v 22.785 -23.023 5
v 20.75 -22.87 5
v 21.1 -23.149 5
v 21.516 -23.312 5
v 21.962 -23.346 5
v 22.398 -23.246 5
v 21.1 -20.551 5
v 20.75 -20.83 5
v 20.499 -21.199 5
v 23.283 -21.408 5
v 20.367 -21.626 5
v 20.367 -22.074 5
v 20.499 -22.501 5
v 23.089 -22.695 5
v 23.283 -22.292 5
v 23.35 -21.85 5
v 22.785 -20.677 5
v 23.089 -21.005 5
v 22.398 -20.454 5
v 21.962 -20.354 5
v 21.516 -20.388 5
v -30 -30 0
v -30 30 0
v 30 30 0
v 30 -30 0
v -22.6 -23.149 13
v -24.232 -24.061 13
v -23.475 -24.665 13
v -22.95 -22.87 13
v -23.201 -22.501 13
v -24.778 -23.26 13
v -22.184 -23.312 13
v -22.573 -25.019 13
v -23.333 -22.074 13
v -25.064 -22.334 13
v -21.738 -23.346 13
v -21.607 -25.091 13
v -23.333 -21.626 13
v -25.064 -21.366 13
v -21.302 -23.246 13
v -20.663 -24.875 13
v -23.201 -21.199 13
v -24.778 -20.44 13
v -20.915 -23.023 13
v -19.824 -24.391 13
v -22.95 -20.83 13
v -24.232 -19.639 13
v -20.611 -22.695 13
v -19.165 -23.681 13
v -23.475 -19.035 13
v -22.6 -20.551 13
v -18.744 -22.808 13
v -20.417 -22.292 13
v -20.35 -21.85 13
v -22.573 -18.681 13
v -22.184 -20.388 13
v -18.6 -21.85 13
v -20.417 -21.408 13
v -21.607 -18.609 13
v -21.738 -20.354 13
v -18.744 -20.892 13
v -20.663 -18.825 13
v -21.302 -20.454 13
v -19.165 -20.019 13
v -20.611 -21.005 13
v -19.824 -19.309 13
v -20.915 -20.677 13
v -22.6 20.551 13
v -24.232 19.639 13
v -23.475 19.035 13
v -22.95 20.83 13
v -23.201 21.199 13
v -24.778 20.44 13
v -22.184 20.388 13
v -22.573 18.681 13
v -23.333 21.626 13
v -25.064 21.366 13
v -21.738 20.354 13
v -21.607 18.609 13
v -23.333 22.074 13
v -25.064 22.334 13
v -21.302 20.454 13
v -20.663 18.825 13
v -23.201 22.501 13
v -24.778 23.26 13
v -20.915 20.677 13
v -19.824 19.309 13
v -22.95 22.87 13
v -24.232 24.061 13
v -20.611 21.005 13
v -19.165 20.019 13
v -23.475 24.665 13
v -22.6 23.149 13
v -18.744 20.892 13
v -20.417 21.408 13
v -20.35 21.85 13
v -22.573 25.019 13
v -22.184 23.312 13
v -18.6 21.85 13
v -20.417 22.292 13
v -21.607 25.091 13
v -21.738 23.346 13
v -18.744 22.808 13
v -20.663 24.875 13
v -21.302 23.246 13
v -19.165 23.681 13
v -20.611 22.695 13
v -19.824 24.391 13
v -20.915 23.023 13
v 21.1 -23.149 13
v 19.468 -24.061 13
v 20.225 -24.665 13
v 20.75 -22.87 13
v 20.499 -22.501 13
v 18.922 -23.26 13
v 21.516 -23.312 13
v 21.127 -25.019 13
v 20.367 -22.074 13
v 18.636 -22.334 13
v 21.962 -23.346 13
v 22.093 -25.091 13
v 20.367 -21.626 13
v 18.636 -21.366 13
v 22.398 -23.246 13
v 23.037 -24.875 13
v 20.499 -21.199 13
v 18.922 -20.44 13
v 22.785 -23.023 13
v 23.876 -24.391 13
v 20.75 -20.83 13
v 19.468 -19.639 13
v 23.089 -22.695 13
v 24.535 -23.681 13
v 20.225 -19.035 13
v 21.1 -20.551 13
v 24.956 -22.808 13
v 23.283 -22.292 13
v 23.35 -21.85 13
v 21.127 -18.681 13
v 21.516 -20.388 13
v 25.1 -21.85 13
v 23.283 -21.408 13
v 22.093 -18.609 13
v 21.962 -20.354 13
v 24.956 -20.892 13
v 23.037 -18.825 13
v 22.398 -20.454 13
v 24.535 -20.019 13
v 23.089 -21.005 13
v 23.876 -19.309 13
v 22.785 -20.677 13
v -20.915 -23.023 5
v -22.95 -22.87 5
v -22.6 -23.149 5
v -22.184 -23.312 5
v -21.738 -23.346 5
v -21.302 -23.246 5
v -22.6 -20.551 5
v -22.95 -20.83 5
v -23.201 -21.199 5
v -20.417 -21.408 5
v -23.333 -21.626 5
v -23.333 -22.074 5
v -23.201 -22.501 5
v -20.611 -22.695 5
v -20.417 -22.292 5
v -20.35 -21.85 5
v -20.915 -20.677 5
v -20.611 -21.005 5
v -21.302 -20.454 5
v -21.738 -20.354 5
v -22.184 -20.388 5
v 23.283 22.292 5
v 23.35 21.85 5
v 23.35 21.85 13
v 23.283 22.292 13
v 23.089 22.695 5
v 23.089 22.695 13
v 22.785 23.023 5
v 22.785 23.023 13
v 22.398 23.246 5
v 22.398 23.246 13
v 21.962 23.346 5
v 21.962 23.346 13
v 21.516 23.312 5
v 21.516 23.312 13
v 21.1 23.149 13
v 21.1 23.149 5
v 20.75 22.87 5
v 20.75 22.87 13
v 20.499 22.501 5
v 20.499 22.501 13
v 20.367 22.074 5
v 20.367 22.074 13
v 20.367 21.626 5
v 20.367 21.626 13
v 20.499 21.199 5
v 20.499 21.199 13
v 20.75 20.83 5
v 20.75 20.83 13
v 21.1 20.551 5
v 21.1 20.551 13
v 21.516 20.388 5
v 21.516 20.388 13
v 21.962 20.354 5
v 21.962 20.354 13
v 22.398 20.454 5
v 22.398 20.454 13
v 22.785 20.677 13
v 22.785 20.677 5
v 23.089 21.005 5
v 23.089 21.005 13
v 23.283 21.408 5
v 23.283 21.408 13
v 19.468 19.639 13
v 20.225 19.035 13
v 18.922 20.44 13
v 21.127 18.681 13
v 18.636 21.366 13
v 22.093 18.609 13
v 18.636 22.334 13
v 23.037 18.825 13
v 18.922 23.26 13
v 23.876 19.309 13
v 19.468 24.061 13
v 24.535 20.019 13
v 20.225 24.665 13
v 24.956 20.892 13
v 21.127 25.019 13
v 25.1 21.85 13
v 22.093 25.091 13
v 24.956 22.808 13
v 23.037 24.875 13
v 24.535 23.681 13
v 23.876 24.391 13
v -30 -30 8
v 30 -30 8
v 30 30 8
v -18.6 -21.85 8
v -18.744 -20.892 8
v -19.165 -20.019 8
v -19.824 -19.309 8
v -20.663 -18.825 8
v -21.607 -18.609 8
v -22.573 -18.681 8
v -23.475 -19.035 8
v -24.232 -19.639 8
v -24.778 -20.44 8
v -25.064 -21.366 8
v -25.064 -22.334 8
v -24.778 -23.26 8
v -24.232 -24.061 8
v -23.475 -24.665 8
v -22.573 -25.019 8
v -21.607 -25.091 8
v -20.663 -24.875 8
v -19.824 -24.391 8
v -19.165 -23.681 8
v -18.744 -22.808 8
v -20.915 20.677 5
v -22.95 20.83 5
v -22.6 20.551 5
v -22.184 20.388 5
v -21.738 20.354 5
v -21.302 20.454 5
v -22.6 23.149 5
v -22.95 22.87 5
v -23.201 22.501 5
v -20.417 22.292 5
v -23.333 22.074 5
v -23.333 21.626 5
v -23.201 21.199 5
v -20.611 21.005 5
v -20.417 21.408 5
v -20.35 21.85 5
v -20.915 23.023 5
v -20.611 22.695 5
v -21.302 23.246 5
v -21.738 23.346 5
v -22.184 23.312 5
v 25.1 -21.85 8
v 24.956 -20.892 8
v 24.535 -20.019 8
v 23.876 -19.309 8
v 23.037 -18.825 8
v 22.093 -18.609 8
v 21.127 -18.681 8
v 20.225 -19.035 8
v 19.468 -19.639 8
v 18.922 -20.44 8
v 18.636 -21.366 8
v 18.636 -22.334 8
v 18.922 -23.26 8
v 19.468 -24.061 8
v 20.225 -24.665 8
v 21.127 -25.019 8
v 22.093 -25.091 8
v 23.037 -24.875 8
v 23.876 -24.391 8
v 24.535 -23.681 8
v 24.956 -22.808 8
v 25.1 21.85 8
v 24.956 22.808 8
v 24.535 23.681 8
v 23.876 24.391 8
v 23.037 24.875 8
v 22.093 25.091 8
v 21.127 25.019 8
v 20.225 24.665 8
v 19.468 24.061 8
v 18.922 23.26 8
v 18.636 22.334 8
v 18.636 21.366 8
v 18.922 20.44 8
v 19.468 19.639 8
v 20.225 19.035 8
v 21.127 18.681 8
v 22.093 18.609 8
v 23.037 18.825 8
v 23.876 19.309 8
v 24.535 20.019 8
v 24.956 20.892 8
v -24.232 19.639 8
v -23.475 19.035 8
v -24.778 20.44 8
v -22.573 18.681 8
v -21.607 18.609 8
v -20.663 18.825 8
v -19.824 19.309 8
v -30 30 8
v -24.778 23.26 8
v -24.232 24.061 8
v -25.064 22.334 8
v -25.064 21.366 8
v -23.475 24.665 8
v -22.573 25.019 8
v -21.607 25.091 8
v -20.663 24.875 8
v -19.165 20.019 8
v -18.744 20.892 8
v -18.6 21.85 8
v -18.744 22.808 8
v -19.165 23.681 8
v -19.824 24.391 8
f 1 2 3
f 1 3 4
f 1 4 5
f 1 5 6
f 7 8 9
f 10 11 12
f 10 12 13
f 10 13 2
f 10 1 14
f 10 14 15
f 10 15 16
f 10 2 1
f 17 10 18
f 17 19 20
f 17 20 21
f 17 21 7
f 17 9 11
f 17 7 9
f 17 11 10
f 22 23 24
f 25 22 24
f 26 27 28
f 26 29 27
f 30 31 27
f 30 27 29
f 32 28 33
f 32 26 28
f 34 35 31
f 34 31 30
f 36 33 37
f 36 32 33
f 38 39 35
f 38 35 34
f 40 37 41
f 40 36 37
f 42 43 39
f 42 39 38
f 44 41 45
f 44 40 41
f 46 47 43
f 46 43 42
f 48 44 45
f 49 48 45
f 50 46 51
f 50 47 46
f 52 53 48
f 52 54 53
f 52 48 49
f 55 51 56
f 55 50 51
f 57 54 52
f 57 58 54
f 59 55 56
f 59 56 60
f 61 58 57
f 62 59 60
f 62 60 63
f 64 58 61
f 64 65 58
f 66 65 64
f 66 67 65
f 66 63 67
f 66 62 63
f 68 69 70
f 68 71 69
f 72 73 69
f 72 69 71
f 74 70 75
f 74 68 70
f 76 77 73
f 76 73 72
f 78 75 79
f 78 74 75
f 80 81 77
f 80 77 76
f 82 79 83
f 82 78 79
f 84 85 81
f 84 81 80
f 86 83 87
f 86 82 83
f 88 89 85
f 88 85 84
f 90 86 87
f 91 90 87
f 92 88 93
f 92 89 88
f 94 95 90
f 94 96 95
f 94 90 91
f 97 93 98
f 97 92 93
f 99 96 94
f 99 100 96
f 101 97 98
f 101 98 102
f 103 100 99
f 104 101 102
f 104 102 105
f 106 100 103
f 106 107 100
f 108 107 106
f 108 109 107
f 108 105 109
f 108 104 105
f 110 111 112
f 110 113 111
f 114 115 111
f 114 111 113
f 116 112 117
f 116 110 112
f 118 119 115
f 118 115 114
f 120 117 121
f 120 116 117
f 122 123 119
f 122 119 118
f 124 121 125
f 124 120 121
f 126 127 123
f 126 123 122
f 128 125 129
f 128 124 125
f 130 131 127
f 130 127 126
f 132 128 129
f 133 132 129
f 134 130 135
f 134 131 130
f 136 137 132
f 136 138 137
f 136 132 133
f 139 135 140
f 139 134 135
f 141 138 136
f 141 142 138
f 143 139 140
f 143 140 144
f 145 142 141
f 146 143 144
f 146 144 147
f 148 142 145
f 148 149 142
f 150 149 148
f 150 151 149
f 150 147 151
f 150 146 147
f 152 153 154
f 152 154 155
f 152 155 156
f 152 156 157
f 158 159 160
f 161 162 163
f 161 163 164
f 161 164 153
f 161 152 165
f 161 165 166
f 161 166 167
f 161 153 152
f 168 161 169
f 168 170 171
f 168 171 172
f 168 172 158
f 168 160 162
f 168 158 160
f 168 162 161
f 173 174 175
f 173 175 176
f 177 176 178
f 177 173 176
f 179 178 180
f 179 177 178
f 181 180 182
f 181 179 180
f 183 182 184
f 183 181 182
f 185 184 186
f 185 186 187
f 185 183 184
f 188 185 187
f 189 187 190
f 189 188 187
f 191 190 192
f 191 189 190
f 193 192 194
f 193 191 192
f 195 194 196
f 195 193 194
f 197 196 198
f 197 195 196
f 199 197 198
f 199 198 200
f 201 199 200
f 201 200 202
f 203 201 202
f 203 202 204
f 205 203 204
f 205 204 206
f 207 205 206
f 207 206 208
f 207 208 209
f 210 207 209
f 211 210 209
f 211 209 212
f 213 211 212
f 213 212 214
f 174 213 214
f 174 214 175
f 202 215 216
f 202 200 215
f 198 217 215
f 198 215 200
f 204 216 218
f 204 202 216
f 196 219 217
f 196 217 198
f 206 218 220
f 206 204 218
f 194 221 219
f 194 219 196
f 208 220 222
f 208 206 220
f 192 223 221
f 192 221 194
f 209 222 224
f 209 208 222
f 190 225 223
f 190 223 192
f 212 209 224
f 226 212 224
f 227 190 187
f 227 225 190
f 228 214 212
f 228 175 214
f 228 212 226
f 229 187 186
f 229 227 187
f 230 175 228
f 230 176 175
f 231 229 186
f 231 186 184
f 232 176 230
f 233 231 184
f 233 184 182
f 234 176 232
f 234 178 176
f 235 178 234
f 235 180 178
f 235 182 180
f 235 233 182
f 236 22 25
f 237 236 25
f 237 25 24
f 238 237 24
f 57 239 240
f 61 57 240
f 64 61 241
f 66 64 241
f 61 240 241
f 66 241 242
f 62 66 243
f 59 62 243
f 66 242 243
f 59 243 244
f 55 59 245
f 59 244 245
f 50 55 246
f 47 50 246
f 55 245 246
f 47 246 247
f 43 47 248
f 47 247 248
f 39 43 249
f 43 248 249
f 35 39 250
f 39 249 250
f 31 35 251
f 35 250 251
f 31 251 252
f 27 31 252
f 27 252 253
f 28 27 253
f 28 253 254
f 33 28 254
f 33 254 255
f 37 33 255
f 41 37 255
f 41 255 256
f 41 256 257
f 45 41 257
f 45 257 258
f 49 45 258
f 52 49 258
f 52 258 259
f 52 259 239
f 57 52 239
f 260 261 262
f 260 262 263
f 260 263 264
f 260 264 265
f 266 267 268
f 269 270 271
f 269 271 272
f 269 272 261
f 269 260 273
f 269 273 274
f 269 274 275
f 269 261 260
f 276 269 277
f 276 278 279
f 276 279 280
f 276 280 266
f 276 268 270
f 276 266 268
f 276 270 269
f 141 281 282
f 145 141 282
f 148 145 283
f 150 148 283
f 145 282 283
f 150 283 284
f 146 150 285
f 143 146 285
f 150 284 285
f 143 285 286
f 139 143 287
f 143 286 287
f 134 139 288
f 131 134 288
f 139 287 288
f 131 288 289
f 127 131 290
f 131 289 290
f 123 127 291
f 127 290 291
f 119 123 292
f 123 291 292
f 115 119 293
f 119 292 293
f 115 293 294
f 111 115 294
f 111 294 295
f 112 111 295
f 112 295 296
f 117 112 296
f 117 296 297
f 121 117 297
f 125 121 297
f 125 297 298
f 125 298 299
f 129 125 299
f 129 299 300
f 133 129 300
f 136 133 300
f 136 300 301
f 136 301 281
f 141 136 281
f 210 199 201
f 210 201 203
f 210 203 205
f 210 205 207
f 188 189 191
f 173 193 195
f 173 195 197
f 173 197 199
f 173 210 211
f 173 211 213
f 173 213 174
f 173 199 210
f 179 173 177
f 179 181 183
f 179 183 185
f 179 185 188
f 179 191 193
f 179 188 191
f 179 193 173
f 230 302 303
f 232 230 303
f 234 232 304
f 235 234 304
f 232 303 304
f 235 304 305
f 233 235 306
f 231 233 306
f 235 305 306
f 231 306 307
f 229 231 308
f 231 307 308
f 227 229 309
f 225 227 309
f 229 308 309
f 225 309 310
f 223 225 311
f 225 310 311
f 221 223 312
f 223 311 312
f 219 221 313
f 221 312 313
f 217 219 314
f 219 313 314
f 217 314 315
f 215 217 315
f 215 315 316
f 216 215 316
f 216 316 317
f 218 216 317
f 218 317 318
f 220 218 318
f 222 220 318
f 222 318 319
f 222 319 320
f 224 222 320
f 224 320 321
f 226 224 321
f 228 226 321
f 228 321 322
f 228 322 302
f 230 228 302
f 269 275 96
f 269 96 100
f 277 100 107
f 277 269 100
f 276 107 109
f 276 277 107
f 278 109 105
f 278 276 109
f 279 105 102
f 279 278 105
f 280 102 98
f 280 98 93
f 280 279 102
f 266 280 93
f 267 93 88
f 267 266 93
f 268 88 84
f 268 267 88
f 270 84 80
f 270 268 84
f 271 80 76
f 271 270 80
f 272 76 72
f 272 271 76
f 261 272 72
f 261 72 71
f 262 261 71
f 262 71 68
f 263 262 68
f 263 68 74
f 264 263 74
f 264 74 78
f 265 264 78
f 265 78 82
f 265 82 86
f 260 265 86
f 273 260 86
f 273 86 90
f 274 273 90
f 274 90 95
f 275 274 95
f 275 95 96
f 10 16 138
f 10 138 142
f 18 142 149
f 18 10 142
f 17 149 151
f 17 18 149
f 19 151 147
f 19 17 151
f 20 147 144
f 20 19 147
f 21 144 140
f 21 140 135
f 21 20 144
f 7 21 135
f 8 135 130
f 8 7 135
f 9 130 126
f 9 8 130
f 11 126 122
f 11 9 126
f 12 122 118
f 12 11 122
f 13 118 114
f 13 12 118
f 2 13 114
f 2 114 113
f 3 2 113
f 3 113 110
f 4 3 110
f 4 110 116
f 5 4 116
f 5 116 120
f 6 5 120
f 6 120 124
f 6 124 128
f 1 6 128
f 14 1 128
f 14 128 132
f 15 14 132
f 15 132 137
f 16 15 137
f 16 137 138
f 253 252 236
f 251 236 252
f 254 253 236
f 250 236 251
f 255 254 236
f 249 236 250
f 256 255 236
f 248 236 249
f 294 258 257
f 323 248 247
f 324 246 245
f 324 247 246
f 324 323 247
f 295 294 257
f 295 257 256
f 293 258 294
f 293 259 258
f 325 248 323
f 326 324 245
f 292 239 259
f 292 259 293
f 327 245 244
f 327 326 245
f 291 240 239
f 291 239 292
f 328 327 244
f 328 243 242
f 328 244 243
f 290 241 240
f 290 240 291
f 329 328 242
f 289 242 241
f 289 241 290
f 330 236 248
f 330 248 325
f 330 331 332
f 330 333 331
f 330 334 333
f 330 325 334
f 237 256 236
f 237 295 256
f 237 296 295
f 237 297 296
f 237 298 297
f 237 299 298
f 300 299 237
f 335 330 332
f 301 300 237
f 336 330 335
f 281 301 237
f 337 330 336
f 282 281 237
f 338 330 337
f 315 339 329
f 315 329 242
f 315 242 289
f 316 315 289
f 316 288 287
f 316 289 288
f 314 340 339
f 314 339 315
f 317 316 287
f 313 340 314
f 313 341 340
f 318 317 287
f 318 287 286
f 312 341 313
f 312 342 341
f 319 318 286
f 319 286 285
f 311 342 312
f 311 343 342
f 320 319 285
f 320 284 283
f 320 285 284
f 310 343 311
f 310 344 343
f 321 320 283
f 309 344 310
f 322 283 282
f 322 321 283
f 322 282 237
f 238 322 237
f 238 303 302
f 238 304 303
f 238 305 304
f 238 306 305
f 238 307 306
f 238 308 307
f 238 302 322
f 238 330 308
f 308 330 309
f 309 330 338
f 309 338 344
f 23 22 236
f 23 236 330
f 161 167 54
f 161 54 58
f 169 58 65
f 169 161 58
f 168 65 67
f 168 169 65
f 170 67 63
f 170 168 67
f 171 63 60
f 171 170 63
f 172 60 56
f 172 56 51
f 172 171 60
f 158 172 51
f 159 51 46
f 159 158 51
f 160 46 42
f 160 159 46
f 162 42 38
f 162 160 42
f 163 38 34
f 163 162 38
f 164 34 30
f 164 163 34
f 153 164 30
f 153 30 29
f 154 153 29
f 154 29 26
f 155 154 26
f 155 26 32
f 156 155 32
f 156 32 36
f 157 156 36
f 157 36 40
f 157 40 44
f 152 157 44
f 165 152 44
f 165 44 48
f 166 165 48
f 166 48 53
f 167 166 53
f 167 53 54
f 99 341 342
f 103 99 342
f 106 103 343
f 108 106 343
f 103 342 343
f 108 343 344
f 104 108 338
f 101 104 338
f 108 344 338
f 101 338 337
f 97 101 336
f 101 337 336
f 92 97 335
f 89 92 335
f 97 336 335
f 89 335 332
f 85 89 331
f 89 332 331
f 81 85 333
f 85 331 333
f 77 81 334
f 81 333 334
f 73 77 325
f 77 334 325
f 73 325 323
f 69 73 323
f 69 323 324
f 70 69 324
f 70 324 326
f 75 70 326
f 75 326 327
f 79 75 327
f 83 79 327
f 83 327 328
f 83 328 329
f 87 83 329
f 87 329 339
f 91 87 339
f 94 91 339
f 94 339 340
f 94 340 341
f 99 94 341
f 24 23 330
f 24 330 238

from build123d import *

# Parameters (mm, degrees)
F0_W     = 60
F0_H     = 60
F0_R     = 3.25
F1_DEPTH = 8
F0_R_2   = 1.5
F2_DEPTH = 13
F3_DEPTH = 5


with BuildPart() as f1:
    # F0 (on Top) → F1 (new body)
    with BuildSketch(Plane.XY):
        Rectangle(F0_W, F0_H)
        with Locations((-21.85, -21.85)):
            Circle(F0_R, mode=Mode.SUBTRACT)
        with Locations((21.85, -21.85)):
            Circle(F0_R, mode=Mode.SUBTRACT)
        with Locations((-21.85, 21.85)):
            Circle(F0_R, mode=Mode.SUBTRACT)
        with Locations((21.85, 21.85)):
            Circle(F0_R, mode=Mode.SUBTRACT)
    extrude(amount=F1_DEPTH)

    # F0 (on Top) → F2 (join)
    with BuildSketch(Plane.XY):
        with Locations((-21.85, 21.85)):
            Circle(F0_R)
        with Locations((-21.85, 21.85)):
            Circle(F0_R_2, mode=Mode.SUBTRACT)
        with Locations((21.85, 21.85)):
            Circle(F0_R)
        with Locations((21.85, 21.85)):
            Circle(F0_R_2, mode=Mode.SUBTRACT)
        with Locations((-21.85, -21.85)):
            Circle(F0_R)
        with Locations((-21.85, -21.85)):
            Circle(F0_R_2, mode=Mode.SUBTRACT)
        with Locations((21.85, -21.85)):
            Circle(F0_R)
        with Locations((21.85, -21.85)):
            Circle(F0_R_2, mode=Mode.SUBTRACT)
    extrude(amount=F2_DEPTH)

    # F0 (on Top) → F3 (join)
    with BuildSketch(Plane.XY):
        with Locations((-21.85, 21.85)):
            Circle(F0_R_2)
        with Locations((21.85, 21.85)):
            Circle(F0_R_2)
        with Locations((-21.85, -21.85)):
            Circle(F0_R_2)
        with Locations((21.85, -21.85)):
            Circle(F0_R_2)
    extrude(amount=F3_DEPTH)


solid = f1.part
